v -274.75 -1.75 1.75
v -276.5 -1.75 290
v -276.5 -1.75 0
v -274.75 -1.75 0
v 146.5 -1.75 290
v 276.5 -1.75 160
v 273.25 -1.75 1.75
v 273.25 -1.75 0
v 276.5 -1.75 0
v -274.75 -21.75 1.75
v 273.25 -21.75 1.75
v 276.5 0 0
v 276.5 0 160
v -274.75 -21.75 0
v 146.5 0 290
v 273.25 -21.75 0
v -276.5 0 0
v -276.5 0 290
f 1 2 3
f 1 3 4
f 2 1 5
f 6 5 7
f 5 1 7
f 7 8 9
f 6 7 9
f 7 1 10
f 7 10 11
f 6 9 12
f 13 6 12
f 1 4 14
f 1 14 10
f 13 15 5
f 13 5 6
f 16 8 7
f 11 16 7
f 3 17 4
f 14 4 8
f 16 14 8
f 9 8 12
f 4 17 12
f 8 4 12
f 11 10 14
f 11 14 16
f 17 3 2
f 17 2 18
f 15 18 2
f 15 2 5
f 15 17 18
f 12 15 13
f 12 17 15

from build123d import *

# Parameters (mm, degrees)
SZKIC2_W                    = 553
SZKIC2_H                    = 1.75
DODANIE_WYCI_GNI_CIE1_DEPTH = 290
WYTNIJ_WYCI_GNI_CIE1_DEPTH  = 10
SZKIC5_W                    = 548
SZKIC5_H                    = 1.75
DODANIE_WYCI_GNI_CIE2_DEPTH = 20


with BuildPart() as part:
    # Szkic2 → Dodanie-wyciągnięcie1 (new body)
    with BuildSketch(Plane.XY):
        with Locations((0, -0.875)):
            Rectangle(SZKIC2_W, SZKIC2_H)
    extrude(amount=DODANIE_WYCI_GNI_CIE1_DEPTH)

    # Szkic3 → Wytnij-wyciągnięcie1 (cut)
    with BuildSketch(Plane(origin=(0, 0, 0), x_dir=(1, 0, 0), z_dir=(0, 1, 0))):
        Polygon((276.5, -290), (146.5, -290), (276.5, -160), align=None)
    extrude(amount=-WYTNIJ_WYCI_GNI_CIE1_DEPTH, mode=Mode.SUBTRACT)

    # Szkic5 → Dodanie-wyciągnięcie2 (add)
    with BuildSketch(Plane.XZ.offset(1.75)):
        with Locations((-0.75, 0.875)):
            Rectangle(SZKIC5_W, SZKIC5_H)
    extrude(amount=DODANIE_WYCI_GNI_CIE2_DEPTH)


solid = part.part
